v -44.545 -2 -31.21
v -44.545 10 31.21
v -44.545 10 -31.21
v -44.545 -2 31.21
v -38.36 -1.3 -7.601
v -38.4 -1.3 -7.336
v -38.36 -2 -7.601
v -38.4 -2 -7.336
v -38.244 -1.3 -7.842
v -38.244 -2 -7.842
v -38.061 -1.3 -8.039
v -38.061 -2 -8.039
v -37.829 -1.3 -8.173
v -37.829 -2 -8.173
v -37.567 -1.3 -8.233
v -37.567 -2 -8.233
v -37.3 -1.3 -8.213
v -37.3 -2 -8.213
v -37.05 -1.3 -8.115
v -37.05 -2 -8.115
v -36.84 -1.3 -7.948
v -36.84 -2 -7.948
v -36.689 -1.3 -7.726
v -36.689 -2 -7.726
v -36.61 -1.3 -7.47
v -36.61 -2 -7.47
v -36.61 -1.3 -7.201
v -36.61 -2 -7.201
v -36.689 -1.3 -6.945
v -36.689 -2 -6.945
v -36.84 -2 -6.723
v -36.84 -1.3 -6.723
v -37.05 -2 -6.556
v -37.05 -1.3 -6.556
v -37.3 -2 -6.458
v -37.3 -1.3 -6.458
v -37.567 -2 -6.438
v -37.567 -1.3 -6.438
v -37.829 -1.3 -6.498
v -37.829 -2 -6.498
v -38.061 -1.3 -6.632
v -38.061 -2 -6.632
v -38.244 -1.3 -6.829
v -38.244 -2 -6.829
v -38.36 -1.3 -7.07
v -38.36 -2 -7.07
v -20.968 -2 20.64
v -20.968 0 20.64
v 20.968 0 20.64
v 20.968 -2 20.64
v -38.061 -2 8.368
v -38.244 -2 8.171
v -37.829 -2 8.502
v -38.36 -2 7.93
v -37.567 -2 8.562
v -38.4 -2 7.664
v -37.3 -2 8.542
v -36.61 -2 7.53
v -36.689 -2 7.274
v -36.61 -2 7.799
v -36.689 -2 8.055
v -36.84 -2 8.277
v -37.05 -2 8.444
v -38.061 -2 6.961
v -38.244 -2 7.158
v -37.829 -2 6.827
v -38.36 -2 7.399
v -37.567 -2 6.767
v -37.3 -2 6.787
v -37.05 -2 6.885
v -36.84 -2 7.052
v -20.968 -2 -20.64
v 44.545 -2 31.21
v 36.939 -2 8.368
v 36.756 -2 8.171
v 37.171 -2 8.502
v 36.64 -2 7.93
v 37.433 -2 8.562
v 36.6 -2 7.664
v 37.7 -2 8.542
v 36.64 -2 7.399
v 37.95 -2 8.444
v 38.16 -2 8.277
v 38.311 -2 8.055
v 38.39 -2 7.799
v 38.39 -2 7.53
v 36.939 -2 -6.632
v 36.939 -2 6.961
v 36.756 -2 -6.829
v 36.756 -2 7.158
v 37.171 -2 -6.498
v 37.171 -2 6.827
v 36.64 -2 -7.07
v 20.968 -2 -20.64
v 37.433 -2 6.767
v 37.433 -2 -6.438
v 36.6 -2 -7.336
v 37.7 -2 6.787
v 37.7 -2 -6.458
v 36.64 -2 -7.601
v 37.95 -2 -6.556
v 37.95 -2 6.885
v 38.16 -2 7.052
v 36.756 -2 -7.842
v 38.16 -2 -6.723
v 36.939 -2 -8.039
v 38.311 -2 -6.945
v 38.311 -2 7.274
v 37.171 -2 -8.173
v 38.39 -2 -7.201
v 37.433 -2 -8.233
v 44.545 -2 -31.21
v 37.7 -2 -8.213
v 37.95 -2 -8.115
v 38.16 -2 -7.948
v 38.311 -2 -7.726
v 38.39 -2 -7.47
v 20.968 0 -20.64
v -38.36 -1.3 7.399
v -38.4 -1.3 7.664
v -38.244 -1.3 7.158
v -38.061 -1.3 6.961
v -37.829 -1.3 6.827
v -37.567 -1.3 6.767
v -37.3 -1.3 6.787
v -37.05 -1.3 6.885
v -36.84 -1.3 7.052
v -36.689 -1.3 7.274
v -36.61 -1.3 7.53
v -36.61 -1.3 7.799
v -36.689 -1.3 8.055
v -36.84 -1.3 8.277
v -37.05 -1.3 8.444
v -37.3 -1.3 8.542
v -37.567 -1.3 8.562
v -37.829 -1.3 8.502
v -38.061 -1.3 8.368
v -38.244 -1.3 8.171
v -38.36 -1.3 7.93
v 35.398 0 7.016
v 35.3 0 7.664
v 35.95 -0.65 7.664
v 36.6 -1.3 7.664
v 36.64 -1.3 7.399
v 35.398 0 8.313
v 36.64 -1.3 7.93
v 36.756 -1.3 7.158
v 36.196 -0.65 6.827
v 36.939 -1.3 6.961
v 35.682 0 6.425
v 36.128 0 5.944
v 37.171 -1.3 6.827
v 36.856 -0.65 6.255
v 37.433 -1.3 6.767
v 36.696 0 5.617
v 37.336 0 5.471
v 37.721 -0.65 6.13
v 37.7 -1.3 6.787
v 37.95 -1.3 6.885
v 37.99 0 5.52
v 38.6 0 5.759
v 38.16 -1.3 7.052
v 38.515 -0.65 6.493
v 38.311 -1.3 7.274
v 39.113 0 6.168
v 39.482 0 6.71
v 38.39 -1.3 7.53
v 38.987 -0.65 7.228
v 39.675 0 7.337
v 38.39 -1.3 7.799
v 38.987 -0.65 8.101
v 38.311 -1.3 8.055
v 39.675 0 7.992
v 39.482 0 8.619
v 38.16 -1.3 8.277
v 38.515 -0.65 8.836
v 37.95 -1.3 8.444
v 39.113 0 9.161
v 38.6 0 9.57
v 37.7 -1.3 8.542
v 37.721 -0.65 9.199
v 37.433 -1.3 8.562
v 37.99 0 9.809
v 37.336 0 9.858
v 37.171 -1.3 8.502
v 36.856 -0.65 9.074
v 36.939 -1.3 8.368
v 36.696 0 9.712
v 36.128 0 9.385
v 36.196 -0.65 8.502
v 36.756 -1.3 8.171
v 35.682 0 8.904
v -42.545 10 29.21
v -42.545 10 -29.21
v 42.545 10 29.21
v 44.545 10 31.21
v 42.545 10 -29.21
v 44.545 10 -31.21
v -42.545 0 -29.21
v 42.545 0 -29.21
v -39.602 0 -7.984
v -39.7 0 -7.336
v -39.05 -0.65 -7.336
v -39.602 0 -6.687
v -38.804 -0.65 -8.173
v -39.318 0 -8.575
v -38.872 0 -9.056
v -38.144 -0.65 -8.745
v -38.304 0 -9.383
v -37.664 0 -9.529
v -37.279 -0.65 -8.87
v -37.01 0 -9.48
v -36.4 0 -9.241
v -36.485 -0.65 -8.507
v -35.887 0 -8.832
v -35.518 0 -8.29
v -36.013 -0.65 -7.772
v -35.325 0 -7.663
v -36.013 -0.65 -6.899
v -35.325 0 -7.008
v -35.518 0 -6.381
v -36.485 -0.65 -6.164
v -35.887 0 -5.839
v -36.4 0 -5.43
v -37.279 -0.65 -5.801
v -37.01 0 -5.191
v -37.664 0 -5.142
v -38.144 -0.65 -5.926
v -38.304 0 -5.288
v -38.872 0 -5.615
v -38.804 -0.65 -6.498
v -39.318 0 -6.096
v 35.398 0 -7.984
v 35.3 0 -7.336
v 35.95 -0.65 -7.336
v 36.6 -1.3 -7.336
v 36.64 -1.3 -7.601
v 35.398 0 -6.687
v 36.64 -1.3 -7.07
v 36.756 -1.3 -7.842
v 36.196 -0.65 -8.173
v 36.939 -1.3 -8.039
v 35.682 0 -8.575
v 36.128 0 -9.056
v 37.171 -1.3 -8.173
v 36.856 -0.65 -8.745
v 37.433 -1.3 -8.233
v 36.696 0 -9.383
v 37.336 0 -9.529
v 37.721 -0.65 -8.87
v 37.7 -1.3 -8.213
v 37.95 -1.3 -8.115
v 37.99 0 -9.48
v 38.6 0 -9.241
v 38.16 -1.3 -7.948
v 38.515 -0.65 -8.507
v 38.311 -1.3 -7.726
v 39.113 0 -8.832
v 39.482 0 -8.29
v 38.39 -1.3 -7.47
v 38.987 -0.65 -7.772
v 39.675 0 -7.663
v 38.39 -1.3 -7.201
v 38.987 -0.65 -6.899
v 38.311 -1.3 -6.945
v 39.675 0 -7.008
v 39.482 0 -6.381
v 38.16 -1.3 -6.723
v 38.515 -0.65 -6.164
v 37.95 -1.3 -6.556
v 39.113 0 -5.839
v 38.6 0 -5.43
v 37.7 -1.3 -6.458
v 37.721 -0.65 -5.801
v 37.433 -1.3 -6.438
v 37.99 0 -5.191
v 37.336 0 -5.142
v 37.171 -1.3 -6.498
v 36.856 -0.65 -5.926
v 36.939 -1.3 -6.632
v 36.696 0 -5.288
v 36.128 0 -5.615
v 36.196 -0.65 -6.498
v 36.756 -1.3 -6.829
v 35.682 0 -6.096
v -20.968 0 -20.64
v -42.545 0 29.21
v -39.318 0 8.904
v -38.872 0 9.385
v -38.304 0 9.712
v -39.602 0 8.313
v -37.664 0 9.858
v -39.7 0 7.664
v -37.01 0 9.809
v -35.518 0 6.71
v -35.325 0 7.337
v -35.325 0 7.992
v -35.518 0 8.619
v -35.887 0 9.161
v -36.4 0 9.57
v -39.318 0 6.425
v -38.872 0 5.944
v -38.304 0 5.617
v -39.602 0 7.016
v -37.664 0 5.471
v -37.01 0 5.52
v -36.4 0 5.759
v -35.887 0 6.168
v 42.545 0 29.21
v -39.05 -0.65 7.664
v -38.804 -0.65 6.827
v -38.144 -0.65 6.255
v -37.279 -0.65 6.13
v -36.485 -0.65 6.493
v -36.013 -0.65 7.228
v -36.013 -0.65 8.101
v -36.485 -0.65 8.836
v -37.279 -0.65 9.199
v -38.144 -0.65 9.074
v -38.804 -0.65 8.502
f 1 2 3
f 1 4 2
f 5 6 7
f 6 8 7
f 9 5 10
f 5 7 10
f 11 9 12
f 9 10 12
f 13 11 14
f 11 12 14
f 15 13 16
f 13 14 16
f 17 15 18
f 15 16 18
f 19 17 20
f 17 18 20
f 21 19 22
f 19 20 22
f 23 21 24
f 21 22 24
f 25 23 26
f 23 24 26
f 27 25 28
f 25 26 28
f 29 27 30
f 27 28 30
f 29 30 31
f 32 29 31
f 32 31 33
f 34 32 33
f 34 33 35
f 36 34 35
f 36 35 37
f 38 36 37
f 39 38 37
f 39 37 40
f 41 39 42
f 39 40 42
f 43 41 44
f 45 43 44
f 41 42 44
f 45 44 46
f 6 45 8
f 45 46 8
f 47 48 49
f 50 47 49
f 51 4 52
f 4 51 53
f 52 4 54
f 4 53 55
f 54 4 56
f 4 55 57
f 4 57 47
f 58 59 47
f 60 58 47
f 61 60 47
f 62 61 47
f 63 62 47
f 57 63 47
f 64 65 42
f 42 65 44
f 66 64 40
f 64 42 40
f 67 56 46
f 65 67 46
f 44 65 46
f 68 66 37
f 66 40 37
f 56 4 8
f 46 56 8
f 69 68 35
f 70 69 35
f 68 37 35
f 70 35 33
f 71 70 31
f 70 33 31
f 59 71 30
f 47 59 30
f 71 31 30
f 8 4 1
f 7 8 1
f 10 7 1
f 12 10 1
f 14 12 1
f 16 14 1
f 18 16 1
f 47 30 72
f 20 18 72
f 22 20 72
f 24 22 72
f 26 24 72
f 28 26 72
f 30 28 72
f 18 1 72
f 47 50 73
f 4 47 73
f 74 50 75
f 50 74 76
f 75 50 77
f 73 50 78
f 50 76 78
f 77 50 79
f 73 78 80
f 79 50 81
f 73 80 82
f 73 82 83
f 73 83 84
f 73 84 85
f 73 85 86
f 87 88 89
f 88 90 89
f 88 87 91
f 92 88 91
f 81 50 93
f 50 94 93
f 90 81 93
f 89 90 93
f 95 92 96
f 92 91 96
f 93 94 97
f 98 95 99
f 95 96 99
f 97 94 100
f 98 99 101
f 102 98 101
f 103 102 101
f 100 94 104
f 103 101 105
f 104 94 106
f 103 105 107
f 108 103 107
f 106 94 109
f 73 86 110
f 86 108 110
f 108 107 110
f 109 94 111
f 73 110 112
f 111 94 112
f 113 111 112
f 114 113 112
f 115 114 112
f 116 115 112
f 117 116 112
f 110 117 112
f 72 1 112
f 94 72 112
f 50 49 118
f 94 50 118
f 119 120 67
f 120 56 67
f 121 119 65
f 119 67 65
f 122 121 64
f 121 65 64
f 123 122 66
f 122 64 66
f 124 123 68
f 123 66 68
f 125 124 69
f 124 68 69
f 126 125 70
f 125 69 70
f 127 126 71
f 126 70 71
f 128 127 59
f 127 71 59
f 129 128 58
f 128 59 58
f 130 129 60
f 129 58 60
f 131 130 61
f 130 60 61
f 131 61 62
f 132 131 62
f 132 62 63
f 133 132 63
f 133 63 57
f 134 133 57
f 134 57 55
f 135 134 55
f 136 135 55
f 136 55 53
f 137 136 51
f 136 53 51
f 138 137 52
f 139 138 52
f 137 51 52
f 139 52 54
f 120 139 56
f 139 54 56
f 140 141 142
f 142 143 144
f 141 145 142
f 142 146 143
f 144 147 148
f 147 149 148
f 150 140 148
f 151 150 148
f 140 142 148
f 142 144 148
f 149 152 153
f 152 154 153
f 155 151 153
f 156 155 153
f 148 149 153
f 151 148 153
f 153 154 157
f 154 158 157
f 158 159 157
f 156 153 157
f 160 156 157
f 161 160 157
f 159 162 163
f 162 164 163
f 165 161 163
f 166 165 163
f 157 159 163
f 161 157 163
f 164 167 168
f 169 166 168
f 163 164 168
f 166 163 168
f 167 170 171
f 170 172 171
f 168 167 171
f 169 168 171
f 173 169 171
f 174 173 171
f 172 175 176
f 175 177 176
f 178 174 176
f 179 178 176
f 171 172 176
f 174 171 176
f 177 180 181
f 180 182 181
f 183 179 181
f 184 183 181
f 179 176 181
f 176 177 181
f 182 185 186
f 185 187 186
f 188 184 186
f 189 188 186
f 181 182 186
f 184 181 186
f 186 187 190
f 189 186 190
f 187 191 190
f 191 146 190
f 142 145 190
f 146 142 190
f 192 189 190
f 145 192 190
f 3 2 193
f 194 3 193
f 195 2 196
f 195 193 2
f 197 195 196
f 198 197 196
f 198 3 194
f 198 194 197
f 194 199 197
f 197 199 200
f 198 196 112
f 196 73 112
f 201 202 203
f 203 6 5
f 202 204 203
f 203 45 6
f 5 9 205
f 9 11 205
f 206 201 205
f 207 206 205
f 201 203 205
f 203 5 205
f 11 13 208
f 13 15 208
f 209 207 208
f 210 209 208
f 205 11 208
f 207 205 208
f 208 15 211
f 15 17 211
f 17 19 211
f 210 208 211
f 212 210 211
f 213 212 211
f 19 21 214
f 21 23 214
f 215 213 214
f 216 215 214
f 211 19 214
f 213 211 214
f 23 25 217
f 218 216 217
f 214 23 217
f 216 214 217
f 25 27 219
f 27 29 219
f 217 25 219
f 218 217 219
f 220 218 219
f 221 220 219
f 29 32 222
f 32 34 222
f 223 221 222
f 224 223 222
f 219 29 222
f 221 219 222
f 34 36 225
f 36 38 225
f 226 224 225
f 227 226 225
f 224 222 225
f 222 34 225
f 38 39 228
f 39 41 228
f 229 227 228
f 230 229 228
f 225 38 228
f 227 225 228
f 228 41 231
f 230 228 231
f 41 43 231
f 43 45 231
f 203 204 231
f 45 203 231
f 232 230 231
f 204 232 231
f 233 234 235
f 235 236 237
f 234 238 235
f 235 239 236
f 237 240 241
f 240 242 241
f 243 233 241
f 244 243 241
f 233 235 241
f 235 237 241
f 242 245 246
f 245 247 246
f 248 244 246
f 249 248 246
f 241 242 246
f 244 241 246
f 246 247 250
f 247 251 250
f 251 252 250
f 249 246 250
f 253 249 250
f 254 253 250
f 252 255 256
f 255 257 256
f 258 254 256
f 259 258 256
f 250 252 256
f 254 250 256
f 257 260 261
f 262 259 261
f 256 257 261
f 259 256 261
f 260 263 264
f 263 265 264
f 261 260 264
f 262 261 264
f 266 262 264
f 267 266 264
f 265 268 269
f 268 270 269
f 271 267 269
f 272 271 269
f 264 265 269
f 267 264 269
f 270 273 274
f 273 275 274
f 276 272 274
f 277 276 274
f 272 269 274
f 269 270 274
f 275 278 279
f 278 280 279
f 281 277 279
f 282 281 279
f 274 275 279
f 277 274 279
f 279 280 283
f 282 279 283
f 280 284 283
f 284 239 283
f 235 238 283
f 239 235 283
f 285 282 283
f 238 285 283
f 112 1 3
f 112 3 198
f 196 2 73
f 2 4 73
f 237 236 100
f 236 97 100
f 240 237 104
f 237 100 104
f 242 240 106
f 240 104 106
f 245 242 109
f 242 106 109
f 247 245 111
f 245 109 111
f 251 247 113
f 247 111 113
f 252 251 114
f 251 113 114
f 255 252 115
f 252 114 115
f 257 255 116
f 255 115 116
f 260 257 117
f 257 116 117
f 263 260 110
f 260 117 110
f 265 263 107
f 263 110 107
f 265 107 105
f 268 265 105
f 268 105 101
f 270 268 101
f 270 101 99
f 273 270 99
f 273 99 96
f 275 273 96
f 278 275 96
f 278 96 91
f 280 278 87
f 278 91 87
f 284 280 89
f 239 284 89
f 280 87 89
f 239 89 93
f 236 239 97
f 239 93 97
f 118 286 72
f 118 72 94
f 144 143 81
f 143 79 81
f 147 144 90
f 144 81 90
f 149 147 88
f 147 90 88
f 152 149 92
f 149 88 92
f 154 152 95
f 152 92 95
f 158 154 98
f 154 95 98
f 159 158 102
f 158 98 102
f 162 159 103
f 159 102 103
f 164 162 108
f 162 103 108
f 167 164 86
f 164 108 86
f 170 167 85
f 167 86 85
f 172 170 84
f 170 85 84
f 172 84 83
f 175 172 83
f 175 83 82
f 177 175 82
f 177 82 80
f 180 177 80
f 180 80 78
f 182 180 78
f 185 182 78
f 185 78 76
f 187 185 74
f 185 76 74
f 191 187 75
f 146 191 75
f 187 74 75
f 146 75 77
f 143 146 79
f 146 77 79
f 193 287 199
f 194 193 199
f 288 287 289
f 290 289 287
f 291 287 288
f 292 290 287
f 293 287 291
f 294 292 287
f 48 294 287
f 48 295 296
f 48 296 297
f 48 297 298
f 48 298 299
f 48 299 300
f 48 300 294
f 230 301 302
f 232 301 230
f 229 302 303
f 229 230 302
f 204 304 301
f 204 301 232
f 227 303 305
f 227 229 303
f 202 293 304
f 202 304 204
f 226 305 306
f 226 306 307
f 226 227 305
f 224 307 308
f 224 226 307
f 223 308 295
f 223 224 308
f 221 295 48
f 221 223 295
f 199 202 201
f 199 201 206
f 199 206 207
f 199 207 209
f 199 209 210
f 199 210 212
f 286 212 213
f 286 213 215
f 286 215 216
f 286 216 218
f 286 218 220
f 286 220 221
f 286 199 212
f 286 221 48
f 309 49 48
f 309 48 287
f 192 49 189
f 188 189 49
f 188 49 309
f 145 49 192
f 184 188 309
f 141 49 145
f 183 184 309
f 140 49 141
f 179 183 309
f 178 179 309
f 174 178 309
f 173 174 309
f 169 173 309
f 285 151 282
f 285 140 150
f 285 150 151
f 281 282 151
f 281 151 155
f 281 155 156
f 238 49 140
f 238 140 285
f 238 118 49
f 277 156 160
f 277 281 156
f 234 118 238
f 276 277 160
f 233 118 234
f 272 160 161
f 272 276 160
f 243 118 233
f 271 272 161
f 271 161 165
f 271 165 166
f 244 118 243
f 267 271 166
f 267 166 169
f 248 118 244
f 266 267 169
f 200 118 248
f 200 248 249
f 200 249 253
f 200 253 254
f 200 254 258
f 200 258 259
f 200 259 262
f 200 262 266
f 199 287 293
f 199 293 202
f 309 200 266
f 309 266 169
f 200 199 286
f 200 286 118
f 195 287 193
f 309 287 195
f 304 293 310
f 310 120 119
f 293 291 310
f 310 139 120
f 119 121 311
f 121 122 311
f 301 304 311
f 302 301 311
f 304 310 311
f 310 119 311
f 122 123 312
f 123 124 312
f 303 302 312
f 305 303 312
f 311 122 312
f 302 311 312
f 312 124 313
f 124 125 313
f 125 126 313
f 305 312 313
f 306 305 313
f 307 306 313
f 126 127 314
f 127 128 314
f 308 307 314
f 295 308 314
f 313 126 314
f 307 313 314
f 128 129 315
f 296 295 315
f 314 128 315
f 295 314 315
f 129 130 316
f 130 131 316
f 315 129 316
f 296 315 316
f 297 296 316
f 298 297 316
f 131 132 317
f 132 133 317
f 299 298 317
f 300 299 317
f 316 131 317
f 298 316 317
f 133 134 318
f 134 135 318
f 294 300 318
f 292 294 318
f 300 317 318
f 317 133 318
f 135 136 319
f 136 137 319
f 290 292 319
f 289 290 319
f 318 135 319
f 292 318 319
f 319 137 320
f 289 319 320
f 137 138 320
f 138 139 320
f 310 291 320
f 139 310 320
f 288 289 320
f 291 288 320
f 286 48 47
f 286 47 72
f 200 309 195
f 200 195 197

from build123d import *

# Parameters (mm, degrees)
SKETCH1_W                                       = 89.09
SKETCH1_H                                       = 62.42
BOSS_EXTRUDE1_DEPTH                             = 2
SKETCH1_3_W                                     = 89.09
SKETCH1_3_H                                     = 62.42
SKETCH1_3_W_2                                   = 85.09
SKETCH1_3_H_2                                   = 58.42
BOSS_EXTRUDE2_DEPTH                             = 10
CSK_FOR_M2_FLAT_HEAD_MACHINE_SCREW1_D           = 1.8
CSK_FOR_M2_FLAT_HEAD_MACHINE_SCREW1_DEPTH       = 9.906
CSK_FOR_M2_FLAT_HEAD_MACHINE_SCREW1_CSINK_D     = 4.4
CSK_FOR_M2_FLAT_HEAD_MACHINE_SCREW1_CSINK_ANGLE = 90
CSK_FOR_M2_FLAT_HEAD_MACHINE_SCREW1_TIP         = 0.540774557
SKETCH7_W                                       = 41.935160688
SKETCH7_H                                       = 41.279429724
CUT_EXTRUDE1_DEPTH                              = 2.54


with BuildPart() as part:
    # Sketch1 → Boss-Extrude1 (new body)
    with BuildSketch(Plane(origin=(0, 0, 0), x_dir=(1, 0, 0), z_dir=(0, 1, 0))):
        Rectangle(SKETCH1_W, SKETCH1_H)
    extrude(amount=-BOSS_EXTRUDE1_DEPTH)

    # Sketch1<3> → Boss-Extrude2 (add)
    with BuildSketch(Plane(origin=(0, 0, 0), x_dir=(1, 0, 0), z_dir=(0, 1, 0))):
        Rectangle(SKETCH1_3_W, SKETCH1_3_H)
        Rectangle(SKETCH1_3_W_2, SKETCH1_3_H_2, mode=Mode.SUBTRACT)
    extrude(amount=BOSS_EXTRUDE2_DEPTH)

    # CSK for M2 Flat Head Machine Screw1
    with Locations(Plane(origin=(0, 0, 0), x_dir=(1, 0, 0), z_dir=(0, 1, 0))):
        with Locations((37.5, 7.335501447), (-37.5, 7.335501447), (-37.5, -7.664498553), (37.5, -7.664498553)):
            CounterSinkHole(CSK_FOR_M2_FLAT_HEAD_MACHINE_SCREW1_D / 2, CSK_FOR_M2_FLAT_HEAD_MACHINE_SCREW1_CSINK_D / 2, depth=CSK_FOR_M2_FLAT_HEAD_MACHINE_SCREW1_DEPTH, counter_sink_angle=CSK_FOR_M2_FLAT_HEAD_MACHINE_SCREW1_CSINK_ANGLE)
            with Locations((0, 0, -(CSK_FOR_M2_FLAT_HEAD_MACHINE_SCREW1_DEPTH + CSK_FOR_M2_FLAT_HEAD_MACHINE_SCREW1_TIP / 2))):  # 118° drill point
                Cone(0, CSK_FOR_M2_FLAT_HEAD_MACHINE_SCREW1_D / 2, CSK_FOR_M2_FLAT_HEAD_MACHINE_SCREW1_TIP, mode=Mode.SUBTRACT)

    # Sketch7 → Cut-Extrude1 (cut)
    with BuildSketch(Plane(origin=(0, 0, 0), x_dir=(1, 0, 0), z_dir=(0, 1, 0))):
        Rectangle(SKETCH7_W, SKETCH7_H)
    extrude(amount=-CUT_EXTRUDE1_DEPTH, mode=Mode.SUBTRACT)


solid = part.part
